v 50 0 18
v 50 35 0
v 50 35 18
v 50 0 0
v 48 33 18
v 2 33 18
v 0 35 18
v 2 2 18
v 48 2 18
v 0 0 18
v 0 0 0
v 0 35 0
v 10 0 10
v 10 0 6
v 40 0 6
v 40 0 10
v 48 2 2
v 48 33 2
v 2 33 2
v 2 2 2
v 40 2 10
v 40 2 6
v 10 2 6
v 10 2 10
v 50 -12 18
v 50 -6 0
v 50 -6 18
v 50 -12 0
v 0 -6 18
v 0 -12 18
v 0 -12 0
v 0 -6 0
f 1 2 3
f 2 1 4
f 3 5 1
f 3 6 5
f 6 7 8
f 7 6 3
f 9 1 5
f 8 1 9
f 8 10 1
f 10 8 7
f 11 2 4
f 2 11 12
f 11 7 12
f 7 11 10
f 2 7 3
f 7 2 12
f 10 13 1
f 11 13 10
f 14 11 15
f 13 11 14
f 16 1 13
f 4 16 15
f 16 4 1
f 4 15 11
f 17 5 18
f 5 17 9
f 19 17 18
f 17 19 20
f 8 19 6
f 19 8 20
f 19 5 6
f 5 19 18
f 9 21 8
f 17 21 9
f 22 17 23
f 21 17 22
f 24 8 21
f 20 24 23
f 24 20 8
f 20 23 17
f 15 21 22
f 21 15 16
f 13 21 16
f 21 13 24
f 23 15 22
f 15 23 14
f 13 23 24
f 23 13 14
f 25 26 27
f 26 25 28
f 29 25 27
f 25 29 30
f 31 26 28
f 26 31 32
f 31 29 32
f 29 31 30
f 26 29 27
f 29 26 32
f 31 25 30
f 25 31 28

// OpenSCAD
$fn=48;
difference(){
  cube([50,35,18]);
  translate([2,2,2]) cube([46,31,20]);
  // brim clamp jaws
  translate([10,-8,6]) cube([30,10,4]);
}
translate([0,-12,0]) cube([50,6,18]);
